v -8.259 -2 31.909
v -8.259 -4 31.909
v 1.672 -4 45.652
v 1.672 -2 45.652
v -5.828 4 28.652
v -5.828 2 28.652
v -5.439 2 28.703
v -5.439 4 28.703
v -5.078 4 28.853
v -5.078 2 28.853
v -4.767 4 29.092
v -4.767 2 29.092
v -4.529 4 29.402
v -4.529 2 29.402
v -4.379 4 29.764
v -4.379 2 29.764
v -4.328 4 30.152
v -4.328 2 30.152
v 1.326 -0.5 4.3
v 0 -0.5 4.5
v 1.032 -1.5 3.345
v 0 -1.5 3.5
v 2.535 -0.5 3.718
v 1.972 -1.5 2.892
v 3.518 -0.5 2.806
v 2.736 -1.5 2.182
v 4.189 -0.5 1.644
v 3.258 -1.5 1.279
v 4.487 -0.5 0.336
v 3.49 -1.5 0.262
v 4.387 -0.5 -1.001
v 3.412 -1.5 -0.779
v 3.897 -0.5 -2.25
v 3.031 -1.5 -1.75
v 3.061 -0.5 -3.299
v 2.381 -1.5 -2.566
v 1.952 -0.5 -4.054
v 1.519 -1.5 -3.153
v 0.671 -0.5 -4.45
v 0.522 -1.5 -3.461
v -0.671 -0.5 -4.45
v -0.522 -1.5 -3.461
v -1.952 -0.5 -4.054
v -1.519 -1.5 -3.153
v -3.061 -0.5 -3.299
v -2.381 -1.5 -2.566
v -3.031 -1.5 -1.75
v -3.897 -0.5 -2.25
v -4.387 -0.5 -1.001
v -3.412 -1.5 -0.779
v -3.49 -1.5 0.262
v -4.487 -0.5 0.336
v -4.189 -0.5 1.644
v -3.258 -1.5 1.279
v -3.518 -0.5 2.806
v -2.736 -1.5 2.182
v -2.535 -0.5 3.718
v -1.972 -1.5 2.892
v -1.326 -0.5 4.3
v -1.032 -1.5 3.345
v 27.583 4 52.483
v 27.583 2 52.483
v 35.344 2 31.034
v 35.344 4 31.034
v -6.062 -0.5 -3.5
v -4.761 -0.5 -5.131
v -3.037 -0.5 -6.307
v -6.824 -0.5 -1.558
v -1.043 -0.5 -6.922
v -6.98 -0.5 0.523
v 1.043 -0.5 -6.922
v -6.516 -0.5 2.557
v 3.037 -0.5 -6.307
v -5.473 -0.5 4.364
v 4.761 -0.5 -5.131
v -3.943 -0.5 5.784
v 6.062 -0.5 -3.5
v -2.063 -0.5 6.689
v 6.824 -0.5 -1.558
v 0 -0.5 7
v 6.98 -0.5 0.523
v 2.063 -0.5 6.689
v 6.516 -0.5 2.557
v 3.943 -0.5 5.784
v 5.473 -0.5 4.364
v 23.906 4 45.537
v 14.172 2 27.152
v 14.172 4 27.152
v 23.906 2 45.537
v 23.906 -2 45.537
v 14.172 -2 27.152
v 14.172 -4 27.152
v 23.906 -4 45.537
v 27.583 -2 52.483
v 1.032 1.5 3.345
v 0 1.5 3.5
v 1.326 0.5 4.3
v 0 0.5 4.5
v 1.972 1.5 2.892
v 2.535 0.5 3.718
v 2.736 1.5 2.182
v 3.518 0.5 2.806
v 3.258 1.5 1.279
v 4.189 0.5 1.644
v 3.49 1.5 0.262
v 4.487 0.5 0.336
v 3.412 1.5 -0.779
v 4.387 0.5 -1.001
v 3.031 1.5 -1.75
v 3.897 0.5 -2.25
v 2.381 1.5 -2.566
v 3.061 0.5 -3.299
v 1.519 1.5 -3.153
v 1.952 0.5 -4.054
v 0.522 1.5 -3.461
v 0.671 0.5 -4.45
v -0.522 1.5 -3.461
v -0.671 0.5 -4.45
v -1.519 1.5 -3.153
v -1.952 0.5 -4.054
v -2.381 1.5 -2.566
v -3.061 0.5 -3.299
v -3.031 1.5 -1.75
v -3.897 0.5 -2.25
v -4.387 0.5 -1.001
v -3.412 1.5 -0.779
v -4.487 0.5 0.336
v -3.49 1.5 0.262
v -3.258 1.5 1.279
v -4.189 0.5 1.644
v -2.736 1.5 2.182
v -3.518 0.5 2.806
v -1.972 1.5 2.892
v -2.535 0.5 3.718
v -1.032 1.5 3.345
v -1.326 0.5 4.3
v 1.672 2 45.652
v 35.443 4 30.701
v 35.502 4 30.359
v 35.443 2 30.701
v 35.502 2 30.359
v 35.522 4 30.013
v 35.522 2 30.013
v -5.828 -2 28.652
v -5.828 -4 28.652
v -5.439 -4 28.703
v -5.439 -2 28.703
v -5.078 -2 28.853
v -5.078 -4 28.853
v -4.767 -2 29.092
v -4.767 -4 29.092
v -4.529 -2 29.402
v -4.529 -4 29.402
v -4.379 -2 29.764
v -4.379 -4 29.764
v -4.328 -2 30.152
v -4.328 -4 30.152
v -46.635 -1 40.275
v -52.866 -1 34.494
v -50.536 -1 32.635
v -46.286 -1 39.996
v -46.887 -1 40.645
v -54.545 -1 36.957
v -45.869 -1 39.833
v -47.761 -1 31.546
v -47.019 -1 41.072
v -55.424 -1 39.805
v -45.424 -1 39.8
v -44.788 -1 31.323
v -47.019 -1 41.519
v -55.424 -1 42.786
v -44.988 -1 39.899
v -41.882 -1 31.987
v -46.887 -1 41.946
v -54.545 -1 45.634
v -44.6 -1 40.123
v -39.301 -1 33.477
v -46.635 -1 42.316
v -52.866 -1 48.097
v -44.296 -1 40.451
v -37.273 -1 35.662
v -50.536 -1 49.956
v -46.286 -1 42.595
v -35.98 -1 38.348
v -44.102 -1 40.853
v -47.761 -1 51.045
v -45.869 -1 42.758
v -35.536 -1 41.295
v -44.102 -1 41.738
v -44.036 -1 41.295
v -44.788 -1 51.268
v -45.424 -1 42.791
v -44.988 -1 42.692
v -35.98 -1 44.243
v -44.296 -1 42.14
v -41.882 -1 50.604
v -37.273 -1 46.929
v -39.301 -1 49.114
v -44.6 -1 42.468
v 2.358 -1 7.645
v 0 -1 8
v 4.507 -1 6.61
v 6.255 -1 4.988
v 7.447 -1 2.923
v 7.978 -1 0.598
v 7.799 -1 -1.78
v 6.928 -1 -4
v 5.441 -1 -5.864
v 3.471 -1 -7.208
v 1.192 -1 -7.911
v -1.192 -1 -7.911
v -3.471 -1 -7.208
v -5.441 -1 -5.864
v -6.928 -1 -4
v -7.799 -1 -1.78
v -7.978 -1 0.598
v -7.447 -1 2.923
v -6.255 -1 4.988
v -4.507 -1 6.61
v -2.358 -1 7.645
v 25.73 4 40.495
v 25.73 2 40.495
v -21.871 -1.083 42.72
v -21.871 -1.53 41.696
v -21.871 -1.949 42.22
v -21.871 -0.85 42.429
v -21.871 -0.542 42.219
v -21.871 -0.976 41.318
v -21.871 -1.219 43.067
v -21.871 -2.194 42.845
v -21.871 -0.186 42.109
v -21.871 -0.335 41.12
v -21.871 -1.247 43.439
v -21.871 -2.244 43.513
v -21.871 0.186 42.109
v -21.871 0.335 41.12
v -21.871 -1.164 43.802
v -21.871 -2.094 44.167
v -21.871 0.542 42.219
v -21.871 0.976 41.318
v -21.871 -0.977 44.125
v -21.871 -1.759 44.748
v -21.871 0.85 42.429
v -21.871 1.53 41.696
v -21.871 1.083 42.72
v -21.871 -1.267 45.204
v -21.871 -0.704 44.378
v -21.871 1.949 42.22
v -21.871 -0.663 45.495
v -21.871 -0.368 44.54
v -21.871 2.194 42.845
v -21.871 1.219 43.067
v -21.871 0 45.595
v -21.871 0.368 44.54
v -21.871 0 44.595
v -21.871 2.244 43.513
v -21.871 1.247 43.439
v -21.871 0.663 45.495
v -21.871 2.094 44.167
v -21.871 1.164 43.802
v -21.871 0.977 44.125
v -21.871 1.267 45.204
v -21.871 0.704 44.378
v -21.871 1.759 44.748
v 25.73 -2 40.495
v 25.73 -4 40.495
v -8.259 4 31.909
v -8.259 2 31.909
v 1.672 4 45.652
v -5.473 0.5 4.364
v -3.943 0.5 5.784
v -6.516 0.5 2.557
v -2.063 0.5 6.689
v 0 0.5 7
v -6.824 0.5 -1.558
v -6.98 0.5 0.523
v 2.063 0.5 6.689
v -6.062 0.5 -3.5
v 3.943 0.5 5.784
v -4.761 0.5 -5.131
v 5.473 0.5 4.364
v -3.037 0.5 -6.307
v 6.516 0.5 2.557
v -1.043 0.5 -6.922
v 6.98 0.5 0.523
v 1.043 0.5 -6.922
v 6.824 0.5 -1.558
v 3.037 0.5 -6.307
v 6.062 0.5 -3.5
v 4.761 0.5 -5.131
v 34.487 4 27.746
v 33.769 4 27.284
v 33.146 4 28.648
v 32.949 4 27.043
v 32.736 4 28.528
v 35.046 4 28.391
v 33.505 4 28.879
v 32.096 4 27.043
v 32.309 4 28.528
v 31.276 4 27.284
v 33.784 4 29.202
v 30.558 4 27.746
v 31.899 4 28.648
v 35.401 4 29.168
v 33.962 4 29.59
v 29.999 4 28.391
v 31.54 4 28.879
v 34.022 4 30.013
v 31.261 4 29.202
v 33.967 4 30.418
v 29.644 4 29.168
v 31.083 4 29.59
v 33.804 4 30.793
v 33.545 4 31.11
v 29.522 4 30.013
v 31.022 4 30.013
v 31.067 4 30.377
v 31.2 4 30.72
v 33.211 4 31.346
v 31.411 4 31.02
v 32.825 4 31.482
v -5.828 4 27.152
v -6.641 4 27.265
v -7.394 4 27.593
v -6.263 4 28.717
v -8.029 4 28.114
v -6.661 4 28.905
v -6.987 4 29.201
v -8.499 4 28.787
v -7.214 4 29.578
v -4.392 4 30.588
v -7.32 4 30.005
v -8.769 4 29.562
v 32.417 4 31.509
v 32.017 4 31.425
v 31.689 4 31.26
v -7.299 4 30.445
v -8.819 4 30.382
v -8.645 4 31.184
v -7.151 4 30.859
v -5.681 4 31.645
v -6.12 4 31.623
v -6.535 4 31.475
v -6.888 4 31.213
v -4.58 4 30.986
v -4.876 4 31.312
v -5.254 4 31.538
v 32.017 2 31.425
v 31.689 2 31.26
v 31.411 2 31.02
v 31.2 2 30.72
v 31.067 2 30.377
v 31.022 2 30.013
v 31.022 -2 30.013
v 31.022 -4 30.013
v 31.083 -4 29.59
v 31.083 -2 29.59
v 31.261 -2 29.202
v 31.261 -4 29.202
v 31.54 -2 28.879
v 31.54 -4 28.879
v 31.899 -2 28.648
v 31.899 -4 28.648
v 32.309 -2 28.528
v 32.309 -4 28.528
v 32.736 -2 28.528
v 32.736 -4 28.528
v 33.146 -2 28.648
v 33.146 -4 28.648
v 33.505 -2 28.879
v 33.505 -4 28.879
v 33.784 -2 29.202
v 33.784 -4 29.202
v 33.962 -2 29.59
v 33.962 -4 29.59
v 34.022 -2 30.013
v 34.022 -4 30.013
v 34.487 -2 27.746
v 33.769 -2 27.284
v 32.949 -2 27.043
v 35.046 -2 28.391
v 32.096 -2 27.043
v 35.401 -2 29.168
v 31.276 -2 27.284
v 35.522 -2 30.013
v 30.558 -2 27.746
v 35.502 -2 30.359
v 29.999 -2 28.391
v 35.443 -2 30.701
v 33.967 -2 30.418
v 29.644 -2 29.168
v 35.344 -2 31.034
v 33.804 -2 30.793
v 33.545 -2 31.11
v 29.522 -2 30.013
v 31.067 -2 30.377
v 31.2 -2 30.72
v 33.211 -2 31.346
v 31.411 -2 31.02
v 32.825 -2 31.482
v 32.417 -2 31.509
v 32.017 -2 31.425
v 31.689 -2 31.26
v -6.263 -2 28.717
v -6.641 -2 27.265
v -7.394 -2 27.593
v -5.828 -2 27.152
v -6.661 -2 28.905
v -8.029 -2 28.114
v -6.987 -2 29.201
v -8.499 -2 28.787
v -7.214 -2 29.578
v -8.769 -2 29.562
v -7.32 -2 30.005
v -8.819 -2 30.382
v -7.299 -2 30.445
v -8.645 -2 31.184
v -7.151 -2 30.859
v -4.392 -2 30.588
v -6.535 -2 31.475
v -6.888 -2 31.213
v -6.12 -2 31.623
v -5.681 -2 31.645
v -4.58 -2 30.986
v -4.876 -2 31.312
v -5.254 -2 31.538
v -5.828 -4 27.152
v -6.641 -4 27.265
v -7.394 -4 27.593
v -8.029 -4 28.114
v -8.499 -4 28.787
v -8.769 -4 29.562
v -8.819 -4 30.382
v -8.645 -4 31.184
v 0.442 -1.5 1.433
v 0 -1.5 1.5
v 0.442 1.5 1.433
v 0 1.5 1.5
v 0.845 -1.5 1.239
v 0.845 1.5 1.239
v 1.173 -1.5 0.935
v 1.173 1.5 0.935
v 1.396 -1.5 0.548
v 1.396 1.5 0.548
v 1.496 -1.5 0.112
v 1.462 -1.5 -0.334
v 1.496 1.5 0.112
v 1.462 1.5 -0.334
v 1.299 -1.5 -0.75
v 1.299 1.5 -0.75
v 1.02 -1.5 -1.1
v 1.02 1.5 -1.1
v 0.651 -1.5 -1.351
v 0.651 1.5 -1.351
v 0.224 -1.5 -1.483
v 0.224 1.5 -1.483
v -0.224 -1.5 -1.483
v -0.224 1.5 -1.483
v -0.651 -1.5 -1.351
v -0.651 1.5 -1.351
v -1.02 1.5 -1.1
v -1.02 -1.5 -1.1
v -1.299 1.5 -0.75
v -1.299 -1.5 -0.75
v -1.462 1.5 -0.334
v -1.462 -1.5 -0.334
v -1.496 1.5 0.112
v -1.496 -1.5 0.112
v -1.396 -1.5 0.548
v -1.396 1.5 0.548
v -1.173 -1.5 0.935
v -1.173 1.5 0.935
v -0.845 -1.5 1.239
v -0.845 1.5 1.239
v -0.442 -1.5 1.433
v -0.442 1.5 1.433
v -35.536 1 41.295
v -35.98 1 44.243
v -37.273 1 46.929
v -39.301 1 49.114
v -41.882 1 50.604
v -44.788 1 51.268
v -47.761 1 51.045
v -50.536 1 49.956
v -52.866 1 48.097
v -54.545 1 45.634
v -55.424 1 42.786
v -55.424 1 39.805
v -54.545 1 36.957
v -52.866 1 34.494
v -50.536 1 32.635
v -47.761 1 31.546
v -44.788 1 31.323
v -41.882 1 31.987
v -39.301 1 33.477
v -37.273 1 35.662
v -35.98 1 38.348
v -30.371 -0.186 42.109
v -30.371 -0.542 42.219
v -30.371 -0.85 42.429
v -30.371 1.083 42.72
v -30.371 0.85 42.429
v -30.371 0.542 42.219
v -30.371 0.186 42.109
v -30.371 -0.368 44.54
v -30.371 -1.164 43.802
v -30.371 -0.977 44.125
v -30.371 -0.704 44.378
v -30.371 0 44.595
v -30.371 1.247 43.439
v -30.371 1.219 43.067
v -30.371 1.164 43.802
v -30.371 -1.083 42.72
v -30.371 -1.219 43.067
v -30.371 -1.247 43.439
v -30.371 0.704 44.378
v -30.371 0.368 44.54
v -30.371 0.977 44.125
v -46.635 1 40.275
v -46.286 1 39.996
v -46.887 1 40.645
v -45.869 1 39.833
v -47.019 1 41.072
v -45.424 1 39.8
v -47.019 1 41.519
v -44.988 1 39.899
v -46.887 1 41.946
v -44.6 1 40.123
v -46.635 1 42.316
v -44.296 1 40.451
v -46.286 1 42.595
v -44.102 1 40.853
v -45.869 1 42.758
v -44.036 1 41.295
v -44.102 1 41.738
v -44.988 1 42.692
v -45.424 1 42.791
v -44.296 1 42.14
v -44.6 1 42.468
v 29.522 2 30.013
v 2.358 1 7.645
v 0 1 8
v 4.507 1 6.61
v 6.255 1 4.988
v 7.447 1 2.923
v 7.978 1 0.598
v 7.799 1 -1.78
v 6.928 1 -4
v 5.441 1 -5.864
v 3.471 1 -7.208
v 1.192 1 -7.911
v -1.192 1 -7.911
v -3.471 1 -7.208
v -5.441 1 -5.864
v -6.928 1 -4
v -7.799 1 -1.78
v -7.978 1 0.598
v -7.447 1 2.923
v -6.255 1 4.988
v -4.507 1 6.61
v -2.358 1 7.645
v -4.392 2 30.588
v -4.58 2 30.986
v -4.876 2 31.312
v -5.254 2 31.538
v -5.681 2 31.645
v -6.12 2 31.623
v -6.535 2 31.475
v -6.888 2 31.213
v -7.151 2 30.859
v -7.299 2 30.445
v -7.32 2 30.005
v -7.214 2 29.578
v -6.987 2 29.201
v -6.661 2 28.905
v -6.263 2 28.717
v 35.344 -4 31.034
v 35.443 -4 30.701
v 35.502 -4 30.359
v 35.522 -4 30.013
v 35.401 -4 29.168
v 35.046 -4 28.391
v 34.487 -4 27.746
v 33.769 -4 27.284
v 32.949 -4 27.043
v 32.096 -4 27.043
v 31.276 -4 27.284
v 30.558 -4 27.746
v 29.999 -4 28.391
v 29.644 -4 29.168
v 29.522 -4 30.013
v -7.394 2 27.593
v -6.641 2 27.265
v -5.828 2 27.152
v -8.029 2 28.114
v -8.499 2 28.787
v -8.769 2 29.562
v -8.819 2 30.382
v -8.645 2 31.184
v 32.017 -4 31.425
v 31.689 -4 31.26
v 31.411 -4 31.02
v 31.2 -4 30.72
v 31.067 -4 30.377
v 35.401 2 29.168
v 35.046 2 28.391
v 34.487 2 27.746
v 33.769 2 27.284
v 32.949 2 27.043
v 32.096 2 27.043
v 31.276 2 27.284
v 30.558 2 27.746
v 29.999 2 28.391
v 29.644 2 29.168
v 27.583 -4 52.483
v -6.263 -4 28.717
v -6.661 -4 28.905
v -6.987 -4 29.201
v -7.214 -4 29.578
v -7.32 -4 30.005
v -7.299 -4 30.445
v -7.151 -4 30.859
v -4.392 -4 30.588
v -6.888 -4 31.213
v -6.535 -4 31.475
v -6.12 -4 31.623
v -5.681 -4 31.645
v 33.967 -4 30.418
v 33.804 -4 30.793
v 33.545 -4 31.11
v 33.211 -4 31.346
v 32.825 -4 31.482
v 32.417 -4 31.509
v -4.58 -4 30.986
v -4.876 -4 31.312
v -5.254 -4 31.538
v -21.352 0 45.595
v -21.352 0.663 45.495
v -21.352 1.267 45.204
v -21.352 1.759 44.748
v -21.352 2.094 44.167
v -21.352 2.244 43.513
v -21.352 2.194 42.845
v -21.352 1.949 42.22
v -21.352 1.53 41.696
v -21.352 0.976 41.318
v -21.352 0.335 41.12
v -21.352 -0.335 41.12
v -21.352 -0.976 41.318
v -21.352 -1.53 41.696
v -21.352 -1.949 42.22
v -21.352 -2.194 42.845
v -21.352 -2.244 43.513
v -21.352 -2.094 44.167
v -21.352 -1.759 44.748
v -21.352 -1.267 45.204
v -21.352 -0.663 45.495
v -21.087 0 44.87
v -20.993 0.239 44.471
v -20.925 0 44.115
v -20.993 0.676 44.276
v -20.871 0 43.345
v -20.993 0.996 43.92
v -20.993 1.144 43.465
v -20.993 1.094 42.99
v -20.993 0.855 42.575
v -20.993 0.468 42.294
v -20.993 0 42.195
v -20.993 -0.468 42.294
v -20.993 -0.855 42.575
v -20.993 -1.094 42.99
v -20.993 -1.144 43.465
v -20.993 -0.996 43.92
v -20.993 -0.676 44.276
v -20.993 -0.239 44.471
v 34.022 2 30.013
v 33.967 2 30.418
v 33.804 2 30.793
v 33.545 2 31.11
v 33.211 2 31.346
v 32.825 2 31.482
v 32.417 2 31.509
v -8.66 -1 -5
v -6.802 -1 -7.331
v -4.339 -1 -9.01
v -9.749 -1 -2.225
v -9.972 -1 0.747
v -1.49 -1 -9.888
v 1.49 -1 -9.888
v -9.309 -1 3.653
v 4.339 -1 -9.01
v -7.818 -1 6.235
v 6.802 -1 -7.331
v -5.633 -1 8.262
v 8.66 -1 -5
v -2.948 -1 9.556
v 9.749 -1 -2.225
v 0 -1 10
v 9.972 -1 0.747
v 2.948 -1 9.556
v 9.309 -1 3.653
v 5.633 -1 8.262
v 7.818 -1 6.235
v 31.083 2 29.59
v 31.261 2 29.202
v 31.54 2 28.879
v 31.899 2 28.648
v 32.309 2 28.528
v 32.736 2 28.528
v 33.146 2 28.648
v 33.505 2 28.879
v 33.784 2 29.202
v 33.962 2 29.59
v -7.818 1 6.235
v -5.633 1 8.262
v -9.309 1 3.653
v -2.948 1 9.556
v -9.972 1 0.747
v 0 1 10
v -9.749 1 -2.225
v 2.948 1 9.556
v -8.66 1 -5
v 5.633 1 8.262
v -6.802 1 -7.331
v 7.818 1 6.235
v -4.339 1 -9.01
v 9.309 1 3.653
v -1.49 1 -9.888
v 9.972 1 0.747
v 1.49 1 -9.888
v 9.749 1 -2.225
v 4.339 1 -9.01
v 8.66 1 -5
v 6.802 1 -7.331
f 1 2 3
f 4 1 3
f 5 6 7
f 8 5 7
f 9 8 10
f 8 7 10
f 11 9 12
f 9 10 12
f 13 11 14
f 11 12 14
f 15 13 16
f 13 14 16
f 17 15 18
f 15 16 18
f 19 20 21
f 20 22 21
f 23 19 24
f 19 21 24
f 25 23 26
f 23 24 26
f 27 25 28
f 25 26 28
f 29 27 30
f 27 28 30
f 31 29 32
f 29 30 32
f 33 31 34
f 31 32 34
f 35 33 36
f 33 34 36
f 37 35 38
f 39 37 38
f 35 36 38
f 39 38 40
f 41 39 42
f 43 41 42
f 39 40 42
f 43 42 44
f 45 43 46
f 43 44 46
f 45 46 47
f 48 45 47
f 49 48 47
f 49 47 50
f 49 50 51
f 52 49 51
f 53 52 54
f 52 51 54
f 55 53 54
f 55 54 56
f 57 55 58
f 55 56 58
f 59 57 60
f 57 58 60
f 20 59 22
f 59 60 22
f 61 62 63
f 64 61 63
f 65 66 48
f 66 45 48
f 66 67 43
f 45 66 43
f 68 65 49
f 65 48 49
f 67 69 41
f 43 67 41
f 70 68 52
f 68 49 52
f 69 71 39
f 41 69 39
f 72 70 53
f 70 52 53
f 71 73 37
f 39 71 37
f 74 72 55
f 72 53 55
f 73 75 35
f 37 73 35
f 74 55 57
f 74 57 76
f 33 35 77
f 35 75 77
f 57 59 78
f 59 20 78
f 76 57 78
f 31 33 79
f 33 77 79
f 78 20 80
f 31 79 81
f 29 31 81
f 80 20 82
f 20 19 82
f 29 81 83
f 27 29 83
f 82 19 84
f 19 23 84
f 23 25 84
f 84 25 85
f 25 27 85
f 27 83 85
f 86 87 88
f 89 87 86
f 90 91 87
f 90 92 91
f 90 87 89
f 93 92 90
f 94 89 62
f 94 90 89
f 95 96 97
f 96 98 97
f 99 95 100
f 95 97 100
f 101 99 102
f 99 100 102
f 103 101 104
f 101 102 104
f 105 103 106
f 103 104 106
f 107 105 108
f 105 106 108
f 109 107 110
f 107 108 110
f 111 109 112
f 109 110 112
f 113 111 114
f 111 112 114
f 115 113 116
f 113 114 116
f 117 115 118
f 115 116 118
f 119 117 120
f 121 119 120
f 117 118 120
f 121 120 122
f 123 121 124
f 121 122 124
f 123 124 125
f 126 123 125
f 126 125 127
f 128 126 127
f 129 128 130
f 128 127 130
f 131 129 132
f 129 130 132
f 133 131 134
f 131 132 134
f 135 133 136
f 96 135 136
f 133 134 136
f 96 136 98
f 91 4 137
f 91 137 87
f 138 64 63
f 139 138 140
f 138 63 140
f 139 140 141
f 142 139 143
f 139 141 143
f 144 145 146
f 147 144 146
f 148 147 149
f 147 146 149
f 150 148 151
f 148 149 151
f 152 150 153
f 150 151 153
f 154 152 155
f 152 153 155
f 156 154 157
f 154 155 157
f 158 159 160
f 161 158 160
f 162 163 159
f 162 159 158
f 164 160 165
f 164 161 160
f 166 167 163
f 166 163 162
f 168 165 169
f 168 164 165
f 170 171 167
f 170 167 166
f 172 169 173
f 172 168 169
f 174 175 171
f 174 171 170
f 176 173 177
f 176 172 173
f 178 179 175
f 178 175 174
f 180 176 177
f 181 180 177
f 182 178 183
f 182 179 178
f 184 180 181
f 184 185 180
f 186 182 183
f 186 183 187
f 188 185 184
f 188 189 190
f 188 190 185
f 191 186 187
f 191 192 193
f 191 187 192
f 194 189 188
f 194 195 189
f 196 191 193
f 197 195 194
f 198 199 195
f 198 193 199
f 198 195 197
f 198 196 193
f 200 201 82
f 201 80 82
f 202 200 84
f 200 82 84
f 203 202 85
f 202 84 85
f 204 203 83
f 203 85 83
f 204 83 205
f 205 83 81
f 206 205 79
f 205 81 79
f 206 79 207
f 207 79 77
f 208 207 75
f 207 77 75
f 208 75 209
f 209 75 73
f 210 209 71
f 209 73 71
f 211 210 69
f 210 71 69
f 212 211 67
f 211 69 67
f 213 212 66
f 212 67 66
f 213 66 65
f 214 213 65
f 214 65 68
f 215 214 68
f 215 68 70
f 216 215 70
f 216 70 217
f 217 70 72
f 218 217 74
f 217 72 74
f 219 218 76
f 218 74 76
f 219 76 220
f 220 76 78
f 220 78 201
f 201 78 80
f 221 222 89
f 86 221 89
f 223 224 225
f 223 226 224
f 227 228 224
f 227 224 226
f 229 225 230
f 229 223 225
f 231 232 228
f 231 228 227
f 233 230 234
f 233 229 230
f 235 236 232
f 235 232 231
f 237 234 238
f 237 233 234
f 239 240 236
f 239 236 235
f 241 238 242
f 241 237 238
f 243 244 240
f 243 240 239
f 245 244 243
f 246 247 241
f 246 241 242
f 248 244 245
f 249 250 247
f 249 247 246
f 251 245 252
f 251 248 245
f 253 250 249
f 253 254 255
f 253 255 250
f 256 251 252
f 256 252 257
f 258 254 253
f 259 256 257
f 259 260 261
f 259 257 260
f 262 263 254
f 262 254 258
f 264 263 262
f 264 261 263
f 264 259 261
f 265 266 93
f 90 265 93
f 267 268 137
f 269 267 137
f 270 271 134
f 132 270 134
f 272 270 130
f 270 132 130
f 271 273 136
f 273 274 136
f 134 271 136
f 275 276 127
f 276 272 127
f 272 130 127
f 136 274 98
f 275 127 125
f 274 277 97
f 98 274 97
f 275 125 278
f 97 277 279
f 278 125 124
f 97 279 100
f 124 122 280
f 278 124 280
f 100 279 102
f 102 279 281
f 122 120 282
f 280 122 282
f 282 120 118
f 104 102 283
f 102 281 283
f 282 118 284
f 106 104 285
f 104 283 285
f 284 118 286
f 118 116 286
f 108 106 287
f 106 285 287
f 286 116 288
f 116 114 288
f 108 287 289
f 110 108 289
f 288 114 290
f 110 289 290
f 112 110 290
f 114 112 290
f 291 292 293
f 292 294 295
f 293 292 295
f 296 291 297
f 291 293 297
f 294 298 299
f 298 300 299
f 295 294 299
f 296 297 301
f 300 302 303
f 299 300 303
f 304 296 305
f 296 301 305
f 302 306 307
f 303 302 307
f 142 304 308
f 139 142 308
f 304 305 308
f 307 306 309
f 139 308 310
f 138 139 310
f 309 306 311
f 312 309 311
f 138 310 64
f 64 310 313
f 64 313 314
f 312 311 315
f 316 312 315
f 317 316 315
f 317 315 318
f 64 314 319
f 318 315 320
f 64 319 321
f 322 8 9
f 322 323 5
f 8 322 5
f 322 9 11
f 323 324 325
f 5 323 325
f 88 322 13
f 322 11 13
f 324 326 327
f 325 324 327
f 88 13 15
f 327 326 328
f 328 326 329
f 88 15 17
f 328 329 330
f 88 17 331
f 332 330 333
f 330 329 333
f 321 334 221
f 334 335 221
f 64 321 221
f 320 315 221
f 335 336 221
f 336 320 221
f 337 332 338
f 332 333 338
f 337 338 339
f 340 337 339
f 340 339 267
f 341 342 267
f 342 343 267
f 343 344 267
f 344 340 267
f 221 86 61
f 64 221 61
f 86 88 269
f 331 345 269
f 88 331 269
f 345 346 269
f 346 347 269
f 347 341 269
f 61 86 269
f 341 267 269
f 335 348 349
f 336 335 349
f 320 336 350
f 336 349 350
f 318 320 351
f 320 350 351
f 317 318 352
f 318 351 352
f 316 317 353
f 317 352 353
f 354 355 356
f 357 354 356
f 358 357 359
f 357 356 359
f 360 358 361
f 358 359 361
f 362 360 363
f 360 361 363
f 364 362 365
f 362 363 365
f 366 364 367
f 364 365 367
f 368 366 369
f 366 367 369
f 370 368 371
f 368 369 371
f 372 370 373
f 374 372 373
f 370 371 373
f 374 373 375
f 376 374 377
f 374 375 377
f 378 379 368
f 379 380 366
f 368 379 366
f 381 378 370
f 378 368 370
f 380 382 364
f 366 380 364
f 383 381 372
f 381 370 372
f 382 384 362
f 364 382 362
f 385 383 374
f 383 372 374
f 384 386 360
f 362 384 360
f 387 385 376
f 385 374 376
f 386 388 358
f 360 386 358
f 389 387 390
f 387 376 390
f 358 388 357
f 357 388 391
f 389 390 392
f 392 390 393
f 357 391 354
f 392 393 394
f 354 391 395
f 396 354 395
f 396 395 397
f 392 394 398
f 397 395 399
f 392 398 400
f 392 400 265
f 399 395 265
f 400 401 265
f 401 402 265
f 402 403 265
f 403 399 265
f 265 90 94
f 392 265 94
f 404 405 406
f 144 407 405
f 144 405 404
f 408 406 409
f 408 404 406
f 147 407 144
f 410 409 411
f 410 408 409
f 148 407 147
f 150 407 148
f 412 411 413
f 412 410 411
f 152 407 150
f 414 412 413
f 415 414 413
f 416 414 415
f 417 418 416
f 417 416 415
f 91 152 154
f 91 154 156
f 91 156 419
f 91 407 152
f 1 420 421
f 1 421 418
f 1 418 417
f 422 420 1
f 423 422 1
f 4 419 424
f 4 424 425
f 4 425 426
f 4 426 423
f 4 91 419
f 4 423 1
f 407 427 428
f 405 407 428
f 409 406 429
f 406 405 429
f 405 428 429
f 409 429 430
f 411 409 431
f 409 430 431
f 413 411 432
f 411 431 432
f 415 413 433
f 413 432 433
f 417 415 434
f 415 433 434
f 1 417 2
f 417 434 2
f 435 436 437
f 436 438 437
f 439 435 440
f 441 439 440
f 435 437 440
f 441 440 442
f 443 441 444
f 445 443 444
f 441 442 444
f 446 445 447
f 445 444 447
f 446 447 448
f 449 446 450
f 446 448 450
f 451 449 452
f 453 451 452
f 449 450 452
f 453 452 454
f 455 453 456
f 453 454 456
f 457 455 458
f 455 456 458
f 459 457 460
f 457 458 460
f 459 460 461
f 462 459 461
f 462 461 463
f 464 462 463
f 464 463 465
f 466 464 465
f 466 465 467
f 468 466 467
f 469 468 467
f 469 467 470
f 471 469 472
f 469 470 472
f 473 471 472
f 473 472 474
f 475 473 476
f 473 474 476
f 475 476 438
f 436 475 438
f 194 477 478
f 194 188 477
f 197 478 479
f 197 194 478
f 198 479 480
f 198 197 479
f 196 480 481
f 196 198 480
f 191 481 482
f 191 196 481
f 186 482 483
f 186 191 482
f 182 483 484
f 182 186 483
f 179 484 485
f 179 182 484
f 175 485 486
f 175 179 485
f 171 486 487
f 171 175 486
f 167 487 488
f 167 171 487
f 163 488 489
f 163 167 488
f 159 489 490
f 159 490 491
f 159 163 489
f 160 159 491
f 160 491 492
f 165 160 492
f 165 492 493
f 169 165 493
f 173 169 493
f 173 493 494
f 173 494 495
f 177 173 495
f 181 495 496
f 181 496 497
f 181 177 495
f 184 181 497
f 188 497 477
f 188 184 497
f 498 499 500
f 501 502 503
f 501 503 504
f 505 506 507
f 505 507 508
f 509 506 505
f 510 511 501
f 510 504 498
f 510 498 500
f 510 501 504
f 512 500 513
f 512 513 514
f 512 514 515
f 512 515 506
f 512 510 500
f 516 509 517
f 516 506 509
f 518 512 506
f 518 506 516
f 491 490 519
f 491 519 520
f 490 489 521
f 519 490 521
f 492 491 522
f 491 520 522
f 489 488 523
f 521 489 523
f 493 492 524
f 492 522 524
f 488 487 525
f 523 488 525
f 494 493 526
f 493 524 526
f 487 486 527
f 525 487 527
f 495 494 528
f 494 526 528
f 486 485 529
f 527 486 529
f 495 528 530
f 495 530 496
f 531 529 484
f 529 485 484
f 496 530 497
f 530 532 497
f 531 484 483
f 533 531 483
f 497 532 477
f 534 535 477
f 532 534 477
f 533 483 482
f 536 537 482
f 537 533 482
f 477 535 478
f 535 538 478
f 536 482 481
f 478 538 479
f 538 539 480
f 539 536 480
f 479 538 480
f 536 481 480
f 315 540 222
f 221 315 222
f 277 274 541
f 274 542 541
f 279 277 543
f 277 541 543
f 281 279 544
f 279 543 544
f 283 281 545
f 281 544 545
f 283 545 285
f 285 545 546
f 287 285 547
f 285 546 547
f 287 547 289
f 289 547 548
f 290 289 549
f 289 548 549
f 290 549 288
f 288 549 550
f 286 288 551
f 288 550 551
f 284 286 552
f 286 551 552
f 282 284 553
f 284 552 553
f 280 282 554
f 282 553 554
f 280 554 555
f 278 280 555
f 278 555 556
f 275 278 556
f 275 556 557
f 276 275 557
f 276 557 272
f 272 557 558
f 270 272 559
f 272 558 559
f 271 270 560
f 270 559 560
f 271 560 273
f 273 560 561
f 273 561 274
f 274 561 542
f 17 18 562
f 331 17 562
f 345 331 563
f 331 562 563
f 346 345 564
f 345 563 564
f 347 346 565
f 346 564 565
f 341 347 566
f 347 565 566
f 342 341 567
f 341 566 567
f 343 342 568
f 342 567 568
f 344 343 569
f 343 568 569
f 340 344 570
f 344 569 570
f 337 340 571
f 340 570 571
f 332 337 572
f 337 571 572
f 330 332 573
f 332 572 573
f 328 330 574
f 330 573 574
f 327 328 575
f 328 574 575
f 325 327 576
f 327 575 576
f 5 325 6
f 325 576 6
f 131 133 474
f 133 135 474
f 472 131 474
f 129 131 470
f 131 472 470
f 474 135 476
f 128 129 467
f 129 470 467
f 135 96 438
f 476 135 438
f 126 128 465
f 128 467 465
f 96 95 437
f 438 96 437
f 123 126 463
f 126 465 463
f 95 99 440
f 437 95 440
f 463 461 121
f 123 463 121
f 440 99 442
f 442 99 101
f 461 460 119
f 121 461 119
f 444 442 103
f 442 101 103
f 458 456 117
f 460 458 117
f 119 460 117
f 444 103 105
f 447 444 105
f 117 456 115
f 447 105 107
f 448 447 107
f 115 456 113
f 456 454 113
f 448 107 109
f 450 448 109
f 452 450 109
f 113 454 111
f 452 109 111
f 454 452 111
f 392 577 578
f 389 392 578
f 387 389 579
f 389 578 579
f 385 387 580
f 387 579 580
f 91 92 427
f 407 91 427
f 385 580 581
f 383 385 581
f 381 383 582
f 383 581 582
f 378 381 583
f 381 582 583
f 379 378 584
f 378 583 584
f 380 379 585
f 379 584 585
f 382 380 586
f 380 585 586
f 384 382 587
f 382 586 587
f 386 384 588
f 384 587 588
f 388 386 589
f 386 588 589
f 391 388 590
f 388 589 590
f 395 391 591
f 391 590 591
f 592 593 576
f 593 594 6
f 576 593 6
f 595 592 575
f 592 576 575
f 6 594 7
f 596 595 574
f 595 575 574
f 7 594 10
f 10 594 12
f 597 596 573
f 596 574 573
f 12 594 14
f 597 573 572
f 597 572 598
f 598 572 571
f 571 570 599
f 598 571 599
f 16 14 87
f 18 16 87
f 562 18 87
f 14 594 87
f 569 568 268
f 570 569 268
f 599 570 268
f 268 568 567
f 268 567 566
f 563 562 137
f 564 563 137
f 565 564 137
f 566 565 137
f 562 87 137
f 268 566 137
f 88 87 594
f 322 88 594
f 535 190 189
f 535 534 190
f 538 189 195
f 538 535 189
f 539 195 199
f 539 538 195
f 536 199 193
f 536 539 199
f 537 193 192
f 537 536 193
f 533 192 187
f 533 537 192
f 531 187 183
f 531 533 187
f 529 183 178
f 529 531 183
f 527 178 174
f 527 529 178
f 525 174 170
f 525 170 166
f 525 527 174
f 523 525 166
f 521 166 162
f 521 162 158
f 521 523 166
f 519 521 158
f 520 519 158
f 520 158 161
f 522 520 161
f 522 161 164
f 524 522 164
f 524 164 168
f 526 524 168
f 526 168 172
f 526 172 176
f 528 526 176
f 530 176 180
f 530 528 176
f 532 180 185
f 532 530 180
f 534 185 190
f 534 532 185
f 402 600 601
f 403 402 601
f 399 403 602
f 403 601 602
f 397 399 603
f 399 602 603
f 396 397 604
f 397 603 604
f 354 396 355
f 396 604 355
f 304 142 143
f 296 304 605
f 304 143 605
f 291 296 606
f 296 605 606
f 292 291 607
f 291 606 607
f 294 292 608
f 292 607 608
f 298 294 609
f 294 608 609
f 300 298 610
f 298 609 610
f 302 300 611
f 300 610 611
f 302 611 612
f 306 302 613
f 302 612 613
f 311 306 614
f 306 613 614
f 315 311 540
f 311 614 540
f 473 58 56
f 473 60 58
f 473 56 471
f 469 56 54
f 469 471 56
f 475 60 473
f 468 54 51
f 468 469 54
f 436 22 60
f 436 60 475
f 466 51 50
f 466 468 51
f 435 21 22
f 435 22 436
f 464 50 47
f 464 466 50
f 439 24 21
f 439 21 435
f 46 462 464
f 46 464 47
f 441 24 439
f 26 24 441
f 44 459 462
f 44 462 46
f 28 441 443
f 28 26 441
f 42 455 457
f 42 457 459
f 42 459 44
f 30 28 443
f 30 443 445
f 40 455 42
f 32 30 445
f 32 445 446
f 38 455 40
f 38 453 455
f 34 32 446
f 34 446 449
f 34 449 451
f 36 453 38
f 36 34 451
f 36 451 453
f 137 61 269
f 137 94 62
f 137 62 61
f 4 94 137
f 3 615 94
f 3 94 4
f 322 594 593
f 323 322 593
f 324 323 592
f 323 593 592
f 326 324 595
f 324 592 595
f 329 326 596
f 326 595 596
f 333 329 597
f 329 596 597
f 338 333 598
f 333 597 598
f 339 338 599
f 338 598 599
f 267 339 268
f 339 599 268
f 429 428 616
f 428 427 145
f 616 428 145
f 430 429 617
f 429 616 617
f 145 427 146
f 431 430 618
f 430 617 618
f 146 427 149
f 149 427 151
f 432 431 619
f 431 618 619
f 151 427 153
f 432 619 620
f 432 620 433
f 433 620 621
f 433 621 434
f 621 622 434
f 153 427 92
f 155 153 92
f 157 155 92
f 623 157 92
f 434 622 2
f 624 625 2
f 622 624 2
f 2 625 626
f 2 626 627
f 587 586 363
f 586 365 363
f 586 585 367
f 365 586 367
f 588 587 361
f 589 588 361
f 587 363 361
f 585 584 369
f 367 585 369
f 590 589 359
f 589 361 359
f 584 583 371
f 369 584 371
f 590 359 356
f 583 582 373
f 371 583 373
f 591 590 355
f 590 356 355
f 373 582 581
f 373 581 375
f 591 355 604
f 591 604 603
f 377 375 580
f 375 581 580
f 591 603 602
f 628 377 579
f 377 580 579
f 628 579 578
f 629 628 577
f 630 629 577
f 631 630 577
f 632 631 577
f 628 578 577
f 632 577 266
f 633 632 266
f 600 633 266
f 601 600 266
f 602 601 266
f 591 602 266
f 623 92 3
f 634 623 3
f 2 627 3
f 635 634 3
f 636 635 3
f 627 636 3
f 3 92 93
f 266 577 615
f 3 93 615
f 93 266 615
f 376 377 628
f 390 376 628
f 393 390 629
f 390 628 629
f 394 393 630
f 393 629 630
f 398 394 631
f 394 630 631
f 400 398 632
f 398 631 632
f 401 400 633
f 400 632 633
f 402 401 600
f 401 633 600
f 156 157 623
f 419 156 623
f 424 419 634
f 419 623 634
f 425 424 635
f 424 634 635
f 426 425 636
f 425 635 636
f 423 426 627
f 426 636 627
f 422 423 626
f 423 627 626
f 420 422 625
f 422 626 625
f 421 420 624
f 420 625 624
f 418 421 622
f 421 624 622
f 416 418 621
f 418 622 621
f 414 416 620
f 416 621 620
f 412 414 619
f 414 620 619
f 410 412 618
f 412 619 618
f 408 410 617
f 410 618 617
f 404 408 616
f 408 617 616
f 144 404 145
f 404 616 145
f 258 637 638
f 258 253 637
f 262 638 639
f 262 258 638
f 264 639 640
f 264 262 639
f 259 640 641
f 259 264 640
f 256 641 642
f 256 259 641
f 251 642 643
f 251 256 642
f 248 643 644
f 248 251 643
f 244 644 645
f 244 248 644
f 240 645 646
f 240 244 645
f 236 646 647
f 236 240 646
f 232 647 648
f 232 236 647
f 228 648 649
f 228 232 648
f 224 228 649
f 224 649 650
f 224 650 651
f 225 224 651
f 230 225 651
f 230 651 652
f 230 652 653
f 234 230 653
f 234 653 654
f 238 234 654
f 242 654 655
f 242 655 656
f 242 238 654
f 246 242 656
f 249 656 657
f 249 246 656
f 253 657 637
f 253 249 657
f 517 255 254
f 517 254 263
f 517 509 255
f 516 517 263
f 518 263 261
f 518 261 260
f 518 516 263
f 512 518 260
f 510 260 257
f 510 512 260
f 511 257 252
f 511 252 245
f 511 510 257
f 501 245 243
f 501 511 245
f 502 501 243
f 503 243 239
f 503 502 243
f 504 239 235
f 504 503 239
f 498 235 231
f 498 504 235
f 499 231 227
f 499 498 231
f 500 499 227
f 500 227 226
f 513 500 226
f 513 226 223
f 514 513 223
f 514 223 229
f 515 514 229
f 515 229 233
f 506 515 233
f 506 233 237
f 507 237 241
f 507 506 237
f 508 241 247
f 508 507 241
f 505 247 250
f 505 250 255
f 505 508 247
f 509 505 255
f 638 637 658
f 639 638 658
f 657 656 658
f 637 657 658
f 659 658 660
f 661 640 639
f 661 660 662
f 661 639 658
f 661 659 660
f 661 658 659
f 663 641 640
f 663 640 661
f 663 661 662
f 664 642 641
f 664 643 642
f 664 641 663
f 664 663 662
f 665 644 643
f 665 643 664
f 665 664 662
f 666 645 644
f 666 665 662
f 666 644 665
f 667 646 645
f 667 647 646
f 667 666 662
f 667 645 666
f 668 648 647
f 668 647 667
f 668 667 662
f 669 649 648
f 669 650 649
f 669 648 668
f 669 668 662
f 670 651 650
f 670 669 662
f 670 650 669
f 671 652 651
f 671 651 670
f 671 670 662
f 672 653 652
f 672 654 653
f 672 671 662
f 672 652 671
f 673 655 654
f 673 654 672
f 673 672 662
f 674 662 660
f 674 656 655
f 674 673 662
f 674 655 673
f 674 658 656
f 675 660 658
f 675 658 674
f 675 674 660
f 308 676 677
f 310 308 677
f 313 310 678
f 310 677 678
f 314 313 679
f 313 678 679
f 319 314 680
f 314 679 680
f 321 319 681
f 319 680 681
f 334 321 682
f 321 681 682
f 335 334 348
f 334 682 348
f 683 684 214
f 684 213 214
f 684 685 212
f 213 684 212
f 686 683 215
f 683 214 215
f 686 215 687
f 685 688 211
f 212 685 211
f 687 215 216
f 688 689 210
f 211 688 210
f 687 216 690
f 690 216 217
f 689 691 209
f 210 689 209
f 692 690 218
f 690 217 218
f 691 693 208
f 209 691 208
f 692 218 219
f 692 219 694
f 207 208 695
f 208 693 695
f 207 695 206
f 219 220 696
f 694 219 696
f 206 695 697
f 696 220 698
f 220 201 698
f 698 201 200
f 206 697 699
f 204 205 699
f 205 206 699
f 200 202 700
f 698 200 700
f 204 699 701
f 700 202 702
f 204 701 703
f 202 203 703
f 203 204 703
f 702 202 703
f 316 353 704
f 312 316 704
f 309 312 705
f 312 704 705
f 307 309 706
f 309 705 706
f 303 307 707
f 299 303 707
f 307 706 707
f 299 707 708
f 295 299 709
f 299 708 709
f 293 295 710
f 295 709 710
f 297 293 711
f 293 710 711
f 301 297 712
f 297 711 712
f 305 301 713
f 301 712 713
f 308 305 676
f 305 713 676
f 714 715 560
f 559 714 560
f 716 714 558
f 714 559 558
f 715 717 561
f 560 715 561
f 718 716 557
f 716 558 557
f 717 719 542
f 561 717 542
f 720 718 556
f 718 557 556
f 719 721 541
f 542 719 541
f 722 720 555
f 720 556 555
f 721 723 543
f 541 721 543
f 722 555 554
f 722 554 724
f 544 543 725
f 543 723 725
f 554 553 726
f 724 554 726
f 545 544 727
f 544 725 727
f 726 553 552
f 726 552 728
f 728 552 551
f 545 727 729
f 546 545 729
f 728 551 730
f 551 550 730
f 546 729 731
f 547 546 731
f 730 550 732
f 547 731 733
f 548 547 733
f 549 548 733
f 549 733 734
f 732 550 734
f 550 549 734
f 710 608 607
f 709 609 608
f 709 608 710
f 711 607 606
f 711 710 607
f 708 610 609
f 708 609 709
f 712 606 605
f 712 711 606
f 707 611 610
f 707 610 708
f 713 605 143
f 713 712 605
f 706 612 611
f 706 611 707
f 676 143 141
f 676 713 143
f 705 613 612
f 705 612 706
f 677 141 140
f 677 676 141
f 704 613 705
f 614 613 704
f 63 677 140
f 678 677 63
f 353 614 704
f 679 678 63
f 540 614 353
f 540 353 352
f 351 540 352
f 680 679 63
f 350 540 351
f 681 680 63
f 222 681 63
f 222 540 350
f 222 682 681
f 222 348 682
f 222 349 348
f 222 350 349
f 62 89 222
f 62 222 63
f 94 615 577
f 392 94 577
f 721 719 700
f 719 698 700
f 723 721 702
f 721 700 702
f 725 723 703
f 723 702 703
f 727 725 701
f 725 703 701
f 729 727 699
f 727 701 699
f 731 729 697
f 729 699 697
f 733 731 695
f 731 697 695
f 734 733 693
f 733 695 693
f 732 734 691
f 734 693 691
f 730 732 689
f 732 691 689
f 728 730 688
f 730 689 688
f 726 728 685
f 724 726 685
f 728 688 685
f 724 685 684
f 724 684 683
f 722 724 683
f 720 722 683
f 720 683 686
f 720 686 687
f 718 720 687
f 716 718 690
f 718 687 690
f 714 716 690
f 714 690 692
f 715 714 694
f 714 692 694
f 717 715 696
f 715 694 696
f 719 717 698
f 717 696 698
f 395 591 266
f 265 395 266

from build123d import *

# Parameters (mm, degrees)
F0_R      = 10
F0_R_2    = 1.5
F1_DEPTH  = 1
F4_DEPTH  = 4
F5_W      = 2
F5_H      = 22.3271135618
F6_DEPTH  = 25
F7_W      = 2
F7_H      = 28.6618866032
F8_DEPTH  = 25
F10_DEPTH = 8
F11_W     = 0.5
F11_H     = 2


with BuildPart() as f1:
    # F0 (on Front) → F1 (new body, symmetric)
    with BuildSketch(Plane.XZ):
        with Locations((-45.535646379, 41.2954837084)):
            Circle(F0_R)
        with Locations((-45.535646379, 41.2954837084)):
            Circle(F0_R_2, mode=Mode.SUBTRACT)
    extrude(amount=F1_DEPTH, both=True)


with BuildPart() as f2:
    # F0 (on Front) → F2 (revolve)
    with BuildSketch(Plane.XZ):
        Polygon((-21.8709991276, 44.595195502), (-30.3709991276, 44.595195502), (-30.3709991276, 43.345195502), (-26.3709991276, 43.345195502), (-21.8709991276, 43.345195502), align=None)
        with BuildLine():
            Line((-21.8709991276, 45.595195502), (-21.8709991276, 44.595195502))
            Line((-21.8709991276, 44.595195502), (-21.8709991276, 43.345195502))
            Line((-21.8709991276, 43.345195502), (-20.8709991276, 43.345195502))
            ThreePointArc((-20.8709991276, 43.345195502), (-20.9926660977, 44.4956449007), (-21.3522841527, 45.595195502))
            Line((-21.3522841527, 45.595195502), (-21.8709991276, 45.595195502))
        make_face()
    revolve(axis=Axis((-24.1209991276, 0, 43.345195502), (-1, 0, 0)))


with BuildPart() as f4:
    # F3 (on Front) → F4 (new body, symmetric)
    with BuildSketch(Plane.XZ):
        Polygon((27.5828548965, 52.4833389268), (1.6723101108, 45.6523098871), (14.1723101108, 27.1523098871), align=None)
    extrude(amount=F4_DEPTH, both=True)

    # F5 (on face) → F6 (join)
    with BuildSketch(Plane(origin=(22.3258671952, 0, 15.0850454022), x_dir=(0, -1, 0), z_dir=(-0.8285889687, 0, -0.5598574113))):
        with Locations((3, 25.7271883774)):
            Rectangle(F5_W, F5_H)
        with Locations((-3, 25.7271883774)):
            Rectangle(F5_W, F5_H)
    extrude(amount=F6_DEPTH)

    # F7 (on face) → F8 (join)
    with BuildSketch(Plane(origin=(-0.1581237587, 0, 0.0837125781), x_dir=(0, 1, 0), z_dir=(0.8837879163, 0, -0.4678877204))):
        with Locations((3, 44.9588765516)):
            Rectangle(F7_W, F7_H)
        with Locations((-3, 44.9588765516)):
            Rectangle(F7_W, F7_H)
    extrude(amount=F8_DEPTH)

    # F9 (on face) → F10 (cut)
    with BuildSketch(Plane.XZ.offset(4)):
        with BuildLine():
            Line((-6.5424141065, 13.1558746052), (14.1723101108, 27.1523098871))
            Line((14.1723101108, 27.1523098871), (-5.8276898892, 27.1523098871))
            ThreePointArc((-5.8276898892, 27.1523098871), (-8.4989781715, 28.786945865), (-8.2592104981, 31.9094972785))
            Line((-8.2592104981, 31.9094972785), (1.6723101108, 45.6523098871))
            Line((1.6723101108, 45.6523098871), (-19.0424141065, 31.6558746052))
            Line((-19.0424141065, 31.6558746052), (-6.5424141065, 13.1558746052))
        make_face()
        with BuildLine():
            Line((23.9056109098, 45.5374336186), (14.1723101108, 27.1523098871))
            Line((14.1723101108, 27.1523098871), (36.2670080195, 15.4551168766))
            Line((36.2670080195, 15.4551168766), (49.6775528052, 40.7861459163))
            Line((49.6775528052, 40.7861459163), (27.5828548965, 52.4833389268))
            Line((27.5828548965, 52.4833389268), (35.3435232626, 31.0335764831))
            ThreePointArc((35.3435232626, 31.0335764831), (35.4774088483, 30.5310275346), (35.5224889809, 30.0129073001))
            ThreePointArc((35.5224889809, 30.0129073001), (32.5224889809, 27.0129073001), (29.5224889809, 30.0129073001))
            Line((29.5224889809, 30.0129073001), (25.7300195237, 40.4949386271))
            Line((25.7300195237, 40.4949386271), (23.9056109098, 45.5374336186))
        make_face()
        with BuildLine():
            ThreePointArc((-4.3276898892, 30.1523098871), (-6.888350061, 31.2129700589), (-5.8276898892, 28.6523098871))
            ThreePointArc((-5.8276898892, 28.6523098871), (-4.7670297174, 29.0916497153), (-4.3276898892, 30.1523098871))
        make_face()
        with BuildLine():
            ThreePointArc((34.0224889809, 30.0129073001), (33.3860674859, 31.2393787289), (32.0168460932, 31.4251131173))
            Line((32.0168460932, 31.4251131173), (32.5224889809, 30.0129073001))
            Line((32.5224889809, 30.0129073001), (31.0224889809, 30.0129073001))
            ThreePointArc((31.0224889809, 30.0129073001), (32.5224889809, 28.5129073001), (34.0224889809, 30.0129073001))
        make_face()
        with BuildLine():
            Line((32.5224889809, 30.0129073001), (32.0168460932, 31.4251131173))
            ThreePointArc((32.0168460932, 31.4251131173), (31.2960175521, 30.8764858051), (31.0224889809, 30.0129073001))
            Line((31.0224889809, 30.0129073001), (32.5224889809, 30.0129073001))
        make_face()
    extrude(amount=-F10_DEPTH, mode=Mode.SUBTRACT)


with BuildPart() as f12:
    # F11 (on Right) → F12 (revolve)
    with BuildSketch(Plane.YZ):
        Polygon((-1, 1.5), (0, 1.5), (1, 1.5), (1, 3.5), (0.5, 3.5), (0.5, 4.5), (0.5, 7), (0.5, 8), (1, 8), (1, 10), (-1, 10), (-1, 8), (-0.5, 8), (-0.5, 7), (-0.5, 4.5), (-0.5, 3.5), (-1, 3.5), align=None)
        with Locations((1.25, 2.5)):
            Rectangle(F11_W, F11_H)
        Polygon((1, 4), (1, 3.5), (1.5, 3.5), align=None)
        Polygon((0.5, 3.5), (1, 3.5), (1, 4), (0.5, 4.5), align=None)
        Polygon((-1, 4), (-1, 3.5), (-0.5, 3.5), (-0.5, 4.5), align=None)
        Polygon((-1.5, 3.5), (-1, 3.5), (-1, 4), align=None)
        with Locations((-1.25, 2.5)):
            Rectangle(F11_W, F11_H)
        Polygon((0.5, 7), (1, 8), (0.5, 8), align=None)
        Polygon((-0.5, 8), (-1, 8), (-0.5, 7), align=None)
    revolve(axis=Axis((0, 0.5, 0), (0, 1, 0)))


solid = Compound([f1.part, f2.part, f4.part, f12.part])
